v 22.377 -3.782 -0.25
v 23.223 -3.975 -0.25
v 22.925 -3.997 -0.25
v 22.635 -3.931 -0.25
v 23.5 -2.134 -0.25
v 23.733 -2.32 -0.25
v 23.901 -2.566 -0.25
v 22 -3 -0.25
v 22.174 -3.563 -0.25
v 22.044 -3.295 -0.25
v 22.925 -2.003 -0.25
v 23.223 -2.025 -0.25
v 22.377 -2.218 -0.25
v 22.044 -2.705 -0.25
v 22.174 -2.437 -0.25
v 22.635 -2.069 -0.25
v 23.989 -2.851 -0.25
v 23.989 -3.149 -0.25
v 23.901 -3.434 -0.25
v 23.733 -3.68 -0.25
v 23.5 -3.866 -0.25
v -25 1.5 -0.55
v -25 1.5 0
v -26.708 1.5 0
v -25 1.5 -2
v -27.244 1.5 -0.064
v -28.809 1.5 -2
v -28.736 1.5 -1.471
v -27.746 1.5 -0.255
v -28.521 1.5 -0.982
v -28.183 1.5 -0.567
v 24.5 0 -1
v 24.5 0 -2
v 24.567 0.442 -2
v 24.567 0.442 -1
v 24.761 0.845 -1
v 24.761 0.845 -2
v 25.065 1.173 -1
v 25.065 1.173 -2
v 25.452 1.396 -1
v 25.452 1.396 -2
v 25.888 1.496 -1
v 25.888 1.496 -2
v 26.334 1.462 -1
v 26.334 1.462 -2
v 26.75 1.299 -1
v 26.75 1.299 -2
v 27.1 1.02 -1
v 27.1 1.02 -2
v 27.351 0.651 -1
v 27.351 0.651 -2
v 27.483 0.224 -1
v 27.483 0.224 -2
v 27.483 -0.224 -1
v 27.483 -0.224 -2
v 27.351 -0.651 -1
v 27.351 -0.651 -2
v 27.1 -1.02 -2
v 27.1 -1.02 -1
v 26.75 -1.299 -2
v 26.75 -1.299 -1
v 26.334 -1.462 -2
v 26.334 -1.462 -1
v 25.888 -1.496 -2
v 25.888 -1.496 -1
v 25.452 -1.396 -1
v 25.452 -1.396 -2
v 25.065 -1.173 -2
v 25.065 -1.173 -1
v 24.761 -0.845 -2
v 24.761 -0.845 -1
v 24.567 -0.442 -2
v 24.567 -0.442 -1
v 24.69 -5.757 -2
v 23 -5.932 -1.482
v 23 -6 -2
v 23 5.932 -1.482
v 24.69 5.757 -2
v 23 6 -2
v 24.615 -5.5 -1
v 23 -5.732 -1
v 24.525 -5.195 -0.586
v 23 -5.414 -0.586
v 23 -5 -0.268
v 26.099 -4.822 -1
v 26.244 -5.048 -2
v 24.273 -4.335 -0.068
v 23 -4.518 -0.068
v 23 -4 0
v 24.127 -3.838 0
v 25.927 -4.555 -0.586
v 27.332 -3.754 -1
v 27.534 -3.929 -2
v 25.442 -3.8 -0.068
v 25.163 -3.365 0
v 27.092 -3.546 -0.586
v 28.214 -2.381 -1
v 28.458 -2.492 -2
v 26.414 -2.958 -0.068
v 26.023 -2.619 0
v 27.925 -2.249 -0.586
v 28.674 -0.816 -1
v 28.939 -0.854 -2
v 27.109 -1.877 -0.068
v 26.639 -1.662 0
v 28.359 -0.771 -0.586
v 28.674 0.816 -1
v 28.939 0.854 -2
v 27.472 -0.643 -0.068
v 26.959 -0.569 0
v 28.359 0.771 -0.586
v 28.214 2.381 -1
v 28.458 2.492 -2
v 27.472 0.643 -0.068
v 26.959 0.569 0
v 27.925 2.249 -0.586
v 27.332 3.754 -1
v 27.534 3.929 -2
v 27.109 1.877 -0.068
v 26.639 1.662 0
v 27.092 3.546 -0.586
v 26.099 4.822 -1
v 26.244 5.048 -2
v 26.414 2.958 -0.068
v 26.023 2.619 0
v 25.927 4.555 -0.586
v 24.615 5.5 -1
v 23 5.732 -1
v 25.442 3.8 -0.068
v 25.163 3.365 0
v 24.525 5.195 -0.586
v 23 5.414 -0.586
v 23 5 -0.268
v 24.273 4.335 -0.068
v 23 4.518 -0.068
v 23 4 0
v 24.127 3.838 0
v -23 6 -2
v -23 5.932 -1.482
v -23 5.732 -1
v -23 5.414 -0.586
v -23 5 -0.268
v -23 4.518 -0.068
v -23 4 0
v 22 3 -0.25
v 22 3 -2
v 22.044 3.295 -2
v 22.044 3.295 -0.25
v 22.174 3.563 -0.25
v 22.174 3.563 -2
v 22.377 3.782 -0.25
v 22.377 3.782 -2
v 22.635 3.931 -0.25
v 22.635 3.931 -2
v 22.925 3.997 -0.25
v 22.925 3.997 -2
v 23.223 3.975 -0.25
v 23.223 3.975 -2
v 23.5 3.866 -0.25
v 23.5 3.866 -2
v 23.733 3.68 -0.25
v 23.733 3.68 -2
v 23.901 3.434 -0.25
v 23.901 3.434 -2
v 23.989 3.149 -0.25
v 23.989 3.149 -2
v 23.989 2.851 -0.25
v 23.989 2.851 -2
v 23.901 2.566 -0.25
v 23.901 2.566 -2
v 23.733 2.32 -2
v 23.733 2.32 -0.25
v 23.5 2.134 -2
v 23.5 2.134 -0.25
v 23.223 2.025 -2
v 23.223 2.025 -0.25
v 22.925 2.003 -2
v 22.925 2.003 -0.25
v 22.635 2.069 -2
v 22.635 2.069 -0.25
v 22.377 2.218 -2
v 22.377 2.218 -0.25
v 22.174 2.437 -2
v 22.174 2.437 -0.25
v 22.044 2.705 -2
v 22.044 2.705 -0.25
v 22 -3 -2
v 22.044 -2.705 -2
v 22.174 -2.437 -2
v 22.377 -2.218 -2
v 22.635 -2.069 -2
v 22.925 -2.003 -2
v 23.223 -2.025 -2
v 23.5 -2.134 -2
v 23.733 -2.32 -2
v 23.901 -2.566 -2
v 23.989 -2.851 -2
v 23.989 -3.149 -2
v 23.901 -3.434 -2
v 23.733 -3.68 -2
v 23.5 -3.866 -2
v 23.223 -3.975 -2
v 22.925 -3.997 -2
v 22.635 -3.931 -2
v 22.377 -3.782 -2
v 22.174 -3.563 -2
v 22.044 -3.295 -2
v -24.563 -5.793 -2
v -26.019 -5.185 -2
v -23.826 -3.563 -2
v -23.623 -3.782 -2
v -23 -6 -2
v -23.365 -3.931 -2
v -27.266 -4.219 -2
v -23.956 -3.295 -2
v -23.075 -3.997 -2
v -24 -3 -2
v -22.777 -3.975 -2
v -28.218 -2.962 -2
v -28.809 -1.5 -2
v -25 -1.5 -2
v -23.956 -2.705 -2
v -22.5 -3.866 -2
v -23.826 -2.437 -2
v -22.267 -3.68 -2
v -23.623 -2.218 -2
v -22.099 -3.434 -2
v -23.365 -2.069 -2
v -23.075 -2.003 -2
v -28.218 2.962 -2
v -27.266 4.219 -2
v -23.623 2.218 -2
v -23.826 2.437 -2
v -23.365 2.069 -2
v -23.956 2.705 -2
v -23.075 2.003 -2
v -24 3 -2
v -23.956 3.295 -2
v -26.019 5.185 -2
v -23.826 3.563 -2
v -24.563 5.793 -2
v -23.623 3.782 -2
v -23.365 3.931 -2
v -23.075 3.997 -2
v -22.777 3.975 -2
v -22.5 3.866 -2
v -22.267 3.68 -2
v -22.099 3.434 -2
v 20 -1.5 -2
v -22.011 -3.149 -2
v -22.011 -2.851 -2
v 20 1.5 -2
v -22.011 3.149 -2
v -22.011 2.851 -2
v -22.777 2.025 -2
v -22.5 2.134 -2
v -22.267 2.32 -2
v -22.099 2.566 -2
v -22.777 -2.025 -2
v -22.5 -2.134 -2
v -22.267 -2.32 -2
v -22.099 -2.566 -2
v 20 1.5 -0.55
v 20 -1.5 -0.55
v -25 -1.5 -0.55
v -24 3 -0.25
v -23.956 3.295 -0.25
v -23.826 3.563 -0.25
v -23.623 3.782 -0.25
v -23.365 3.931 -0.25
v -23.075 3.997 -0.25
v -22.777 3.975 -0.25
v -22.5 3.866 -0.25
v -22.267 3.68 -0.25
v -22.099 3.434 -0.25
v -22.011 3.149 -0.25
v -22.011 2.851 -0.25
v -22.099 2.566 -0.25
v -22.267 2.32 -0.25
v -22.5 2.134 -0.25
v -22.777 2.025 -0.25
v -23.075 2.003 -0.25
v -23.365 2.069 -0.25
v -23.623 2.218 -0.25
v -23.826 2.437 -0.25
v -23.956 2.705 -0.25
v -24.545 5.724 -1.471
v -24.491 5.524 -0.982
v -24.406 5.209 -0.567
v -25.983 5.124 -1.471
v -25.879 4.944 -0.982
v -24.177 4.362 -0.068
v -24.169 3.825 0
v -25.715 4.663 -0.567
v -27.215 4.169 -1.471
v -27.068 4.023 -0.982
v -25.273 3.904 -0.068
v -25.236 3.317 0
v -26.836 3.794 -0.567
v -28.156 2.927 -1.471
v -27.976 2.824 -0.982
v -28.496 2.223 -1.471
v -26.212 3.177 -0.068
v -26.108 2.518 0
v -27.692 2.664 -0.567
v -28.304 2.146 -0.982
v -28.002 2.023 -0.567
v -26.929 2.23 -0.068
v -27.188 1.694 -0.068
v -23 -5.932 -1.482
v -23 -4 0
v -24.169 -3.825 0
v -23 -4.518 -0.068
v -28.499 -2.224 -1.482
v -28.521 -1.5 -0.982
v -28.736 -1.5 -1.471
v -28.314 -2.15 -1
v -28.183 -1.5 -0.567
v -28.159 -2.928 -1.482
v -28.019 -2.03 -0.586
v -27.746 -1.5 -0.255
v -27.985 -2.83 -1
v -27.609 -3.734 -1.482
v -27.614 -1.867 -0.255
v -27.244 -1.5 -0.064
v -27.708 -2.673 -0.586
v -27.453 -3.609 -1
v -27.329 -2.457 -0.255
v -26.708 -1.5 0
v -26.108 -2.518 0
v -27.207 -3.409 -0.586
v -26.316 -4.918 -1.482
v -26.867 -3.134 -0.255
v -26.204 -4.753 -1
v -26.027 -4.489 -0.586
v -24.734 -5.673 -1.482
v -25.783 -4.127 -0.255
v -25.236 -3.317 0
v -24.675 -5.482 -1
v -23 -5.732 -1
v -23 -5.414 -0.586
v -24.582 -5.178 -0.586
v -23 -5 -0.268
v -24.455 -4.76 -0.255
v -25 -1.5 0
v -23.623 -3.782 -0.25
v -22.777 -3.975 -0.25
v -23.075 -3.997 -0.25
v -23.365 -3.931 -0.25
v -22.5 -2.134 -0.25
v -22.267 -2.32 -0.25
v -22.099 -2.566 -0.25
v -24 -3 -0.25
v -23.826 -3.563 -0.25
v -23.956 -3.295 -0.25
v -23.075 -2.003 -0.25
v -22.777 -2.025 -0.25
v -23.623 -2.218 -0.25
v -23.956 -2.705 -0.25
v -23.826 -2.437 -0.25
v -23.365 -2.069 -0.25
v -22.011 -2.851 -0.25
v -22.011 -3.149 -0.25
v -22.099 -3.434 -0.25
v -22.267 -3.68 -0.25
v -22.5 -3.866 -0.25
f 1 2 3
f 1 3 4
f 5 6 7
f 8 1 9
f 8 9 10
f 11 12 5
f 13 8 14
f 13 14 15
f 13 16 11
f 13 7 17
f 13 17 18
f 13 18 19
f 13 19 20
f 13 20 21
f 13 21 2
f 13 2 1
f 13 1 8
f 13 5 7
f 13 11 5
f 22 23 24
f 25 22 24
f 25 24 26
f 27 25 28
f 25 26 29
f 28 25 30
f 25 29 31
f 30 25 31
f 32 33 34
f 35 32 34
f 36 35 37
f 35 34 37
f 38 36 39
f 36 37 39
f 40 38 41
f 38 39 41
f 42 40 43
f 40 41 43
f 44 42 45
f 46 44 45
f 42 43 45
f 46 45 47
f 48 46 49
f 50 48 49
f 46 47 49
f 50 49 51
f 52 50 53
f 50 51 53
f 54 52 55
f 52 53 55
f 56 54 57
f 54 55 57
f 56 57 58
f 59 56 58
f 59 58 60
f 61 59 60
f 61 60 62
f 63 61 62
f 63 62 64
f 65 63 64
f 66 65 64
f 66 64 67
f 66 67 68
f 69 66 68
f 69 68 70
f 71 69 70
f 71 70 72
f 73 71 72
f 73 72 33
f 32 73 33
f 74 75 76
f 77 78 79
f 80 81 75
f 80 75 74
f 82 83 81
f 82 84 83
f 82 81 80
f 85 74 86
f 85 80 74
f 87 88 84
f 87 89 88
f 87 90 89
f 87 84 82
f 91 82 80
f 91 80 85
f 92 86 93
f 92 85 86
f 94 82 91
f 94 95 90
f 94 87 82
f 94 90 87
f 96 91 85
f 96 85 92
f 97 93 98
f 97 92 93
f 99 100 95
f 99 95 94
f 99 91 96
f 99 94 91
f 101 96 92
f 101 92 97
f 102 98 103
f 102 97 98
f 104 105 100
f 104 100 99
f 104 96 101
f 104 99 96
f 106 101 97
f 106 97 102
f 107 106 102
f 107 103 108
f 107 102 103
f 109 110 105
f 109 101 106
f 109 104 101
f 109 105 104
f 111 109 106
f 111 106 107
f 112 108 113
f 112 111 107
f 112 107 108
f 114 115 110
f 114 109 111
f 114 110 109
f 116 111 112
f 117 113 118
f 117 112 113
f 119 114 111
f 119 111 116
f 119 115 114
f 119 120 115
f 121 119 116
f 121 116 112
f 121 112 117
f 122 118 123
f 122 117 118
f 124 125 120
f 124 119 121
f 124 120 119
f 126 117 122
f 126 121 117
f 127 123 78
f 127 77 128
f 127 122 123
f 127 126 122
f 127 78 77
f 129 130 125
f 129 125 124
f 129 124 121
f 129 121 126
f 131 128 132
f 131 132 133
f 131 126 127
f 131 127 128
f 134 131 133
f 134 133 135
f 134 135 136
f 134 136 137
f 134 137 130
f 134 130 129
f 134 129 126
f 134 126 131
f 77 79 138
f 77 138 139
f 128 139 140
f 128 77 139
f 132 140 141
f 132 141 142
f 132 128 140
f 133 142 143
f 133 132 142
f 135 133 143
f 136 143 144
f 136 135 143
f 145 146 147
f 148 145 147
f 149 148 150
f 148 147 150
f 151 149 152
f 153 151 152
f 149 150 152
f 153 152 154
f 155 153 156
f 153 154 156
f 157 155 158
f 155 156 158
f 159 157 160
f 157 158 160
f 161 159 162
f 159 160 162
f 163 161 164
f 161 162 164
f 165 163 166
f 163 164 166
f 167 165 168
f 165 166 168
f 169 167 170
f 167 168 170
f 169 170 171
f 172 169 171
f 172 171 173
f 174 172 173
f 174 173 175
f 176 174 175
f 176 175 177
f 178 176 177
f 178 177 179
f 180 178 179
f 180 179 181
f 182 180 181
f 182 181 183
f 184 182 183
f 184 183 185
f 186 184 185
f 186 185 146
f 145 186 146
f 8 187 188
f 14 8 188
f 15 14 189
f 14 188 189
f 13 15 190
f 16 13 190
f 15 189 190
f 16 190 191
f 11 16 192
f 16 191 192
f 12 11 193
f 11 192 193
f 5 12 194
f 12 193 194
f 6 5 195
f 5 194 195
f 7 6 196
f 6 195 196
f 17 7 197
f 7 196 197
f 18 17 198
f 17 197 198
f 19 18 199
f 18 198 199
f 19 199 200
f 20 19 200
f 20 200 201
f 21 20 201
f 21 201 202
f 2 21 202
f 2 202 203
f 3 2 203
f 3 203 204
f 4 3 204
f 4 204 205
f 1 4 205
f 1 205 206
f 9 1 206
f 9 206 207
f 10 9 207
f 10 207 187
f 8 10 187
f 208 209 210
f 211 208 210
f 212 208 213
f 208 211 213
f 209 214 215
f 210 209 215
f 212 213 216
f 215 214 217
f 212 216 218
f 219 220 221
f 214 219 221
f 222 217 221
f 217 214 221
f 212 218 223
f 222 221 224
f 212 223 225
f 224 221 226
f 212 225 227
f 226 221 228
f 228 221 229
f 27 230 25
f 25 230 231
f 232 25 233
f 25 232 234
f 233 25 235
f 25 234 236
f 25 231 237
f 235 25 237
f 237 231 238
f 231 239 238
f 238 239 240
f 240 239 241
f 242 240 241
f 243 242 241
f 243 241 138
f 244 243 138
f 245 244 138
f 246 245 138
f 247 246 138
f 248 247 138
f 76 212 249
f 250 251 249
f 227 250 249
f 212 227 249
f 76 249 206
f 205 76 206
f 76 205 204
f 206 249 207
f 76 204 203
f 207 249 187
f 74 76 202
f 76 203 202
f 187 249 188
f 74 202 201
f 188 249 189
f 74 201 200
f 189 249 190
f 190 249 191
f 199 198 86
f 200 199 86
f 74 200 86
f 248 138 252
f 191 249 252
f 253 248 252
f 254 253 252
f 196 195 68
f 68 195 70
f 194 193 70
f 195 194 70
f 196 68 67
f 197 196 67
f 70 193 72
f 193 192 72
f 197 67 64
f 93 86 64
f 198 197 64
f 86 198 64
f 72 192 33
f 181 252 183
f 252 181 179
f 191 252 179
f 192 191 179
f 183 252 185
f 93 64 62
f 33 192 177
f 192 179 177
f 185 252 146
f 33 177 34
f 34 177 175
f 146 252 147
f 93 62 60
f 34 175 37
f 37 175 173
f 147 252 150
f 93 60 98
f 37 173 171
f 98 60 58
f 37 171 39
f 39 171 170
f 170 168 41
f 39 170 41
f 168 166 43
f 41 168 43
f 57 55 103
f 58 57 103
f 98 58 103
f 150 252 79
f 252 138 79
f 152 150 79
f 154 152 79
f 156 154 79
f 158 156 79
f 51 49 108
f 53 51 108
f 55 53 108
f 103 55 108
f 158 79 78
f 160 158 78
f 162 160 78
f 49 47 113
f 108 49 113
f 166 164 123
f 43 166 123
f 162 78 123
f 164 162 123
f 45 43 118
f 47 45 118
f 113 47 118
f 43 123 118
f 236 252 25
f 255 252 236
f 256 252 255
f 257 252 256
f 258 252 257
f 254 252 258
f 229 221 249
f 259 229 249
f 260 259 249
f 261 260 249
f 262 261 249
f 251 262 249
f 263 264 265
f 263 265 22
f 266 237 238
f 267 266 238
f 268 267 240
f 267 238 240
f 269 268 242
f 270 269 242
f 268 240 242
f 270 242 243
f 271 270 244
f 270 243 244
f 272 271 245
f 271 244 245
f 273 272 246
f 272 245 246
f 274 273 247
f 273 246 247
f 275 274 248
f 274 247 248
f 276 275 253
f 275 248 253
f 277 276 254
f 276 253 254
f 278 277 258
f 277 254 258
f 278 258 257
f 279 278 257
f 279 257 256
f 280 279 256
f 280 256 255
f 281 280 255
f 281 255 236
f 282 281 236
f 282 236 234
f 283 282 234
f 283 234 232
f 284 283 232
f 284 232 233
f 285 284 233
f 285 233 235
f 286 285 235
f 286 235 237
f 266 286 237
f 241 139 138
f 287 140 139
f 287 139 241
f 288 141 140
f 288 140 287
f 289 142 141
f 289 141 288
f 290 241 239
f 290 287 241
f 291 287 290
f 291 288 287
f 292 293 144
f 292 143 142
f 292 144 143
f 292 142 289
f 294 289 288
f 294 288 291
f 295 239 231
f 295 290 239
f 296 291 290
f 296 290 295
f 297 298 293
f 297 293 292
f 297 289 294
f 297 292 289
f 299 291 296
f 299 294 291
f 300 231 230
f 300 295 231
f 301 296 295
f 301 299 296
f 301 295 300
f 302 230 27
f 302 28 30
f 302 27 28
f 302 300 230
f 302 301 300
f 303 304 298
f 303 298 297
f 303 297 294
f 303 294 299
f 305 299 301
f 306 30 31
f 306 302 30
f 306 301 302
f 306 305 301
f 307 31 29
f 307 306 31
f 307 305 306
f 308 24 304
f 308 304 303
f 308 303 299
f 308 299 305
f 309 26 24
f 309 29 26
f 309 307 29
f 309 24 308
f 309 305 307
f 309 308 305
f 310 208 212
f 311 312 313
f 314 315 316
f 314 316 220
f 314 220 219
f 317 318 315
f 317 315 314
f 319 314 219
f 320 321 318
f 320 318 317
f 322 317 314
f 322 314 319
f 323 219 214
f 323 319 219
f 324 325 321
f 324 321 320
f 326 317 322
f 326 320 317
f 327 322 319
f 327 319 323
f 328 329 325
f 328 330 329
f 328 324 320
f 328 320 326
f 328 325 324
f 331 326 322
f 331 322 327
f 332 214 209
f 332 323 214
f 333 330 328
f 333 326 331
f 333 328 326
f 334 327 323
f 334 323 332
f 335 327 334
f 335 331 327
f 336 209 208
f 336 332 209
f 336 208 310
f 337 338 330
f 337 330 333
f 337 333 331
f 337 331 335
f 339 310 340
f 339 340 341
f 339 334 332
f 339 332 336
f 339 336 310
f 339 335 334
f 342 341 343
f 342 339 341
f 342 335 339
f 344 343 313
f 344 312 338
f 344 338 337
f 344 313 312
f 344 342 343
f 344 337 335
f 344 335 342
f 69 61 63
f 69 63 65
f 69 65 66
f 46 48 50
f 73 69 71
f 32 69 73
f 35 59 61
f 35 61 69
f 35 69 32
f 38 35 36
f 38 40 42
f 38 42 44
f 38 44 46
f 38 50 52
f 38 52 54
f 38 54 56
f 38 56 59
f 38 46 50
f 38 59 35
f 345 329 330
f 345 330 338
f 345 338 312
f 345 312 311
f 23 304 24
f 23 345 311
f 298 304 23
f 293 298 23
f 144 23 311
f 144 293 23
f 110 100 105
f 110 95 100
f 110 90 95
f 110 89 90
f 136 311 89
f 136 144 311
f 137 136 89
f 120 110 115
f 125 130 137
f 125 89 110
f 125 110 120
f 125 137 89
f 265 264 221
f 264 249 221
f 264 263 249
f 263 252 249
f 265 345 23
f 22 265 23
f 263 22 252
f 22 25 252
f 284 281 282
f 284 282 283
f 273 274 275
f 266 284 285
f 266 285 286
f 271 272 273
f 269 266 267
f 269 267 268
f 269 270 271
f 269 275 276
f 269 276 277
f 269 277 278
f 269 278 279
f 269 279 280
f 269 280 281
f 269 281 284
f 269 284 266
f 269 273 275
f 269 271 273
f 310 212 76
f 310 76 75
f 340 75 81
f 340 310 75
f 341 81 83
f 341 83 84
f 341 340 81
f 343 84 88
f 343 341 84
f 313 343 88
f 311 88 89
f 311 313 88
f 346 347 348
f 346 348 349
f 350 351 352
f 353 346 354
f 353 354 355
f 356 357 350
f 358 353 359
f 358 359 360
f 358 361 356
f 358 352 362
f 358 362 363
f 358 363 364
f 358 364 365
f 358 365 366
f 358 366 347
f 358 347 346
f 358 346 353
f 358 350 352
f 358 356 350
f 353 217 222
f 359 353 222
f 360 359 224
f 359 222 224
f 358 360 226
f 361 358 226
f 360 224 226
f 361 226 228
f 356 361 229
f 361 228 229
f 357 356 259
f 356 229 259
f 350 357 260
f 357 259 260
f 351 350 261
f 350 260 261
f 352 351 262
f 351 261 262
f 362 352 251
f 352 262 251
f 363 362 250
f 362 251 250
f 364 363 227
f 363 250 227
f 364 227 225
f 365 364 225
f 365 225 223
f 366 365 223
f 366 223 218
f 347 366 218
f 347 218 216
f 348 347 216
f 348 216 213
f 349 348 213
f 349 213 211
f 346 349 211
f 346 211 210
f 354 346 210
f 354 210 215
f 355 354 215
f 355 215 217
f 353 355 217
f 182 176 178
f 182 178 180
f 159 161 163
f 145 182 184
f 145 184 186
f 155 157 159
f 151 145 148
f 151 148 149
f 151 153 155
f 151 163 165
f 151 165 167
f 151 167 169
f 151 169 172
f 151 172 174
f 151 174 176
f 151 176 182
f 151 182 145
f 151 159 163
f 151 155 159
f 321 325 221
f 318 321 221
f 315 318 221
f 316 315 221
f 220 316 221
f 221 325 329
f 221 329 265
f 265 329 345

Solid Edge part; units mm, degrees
sketch "Sketch1" plane through (0, 0, 0) normal (0, 0, 1) x (1, 0, 0)
  line L0 (-23, -6) -> (23, -6)
  arc A0 (23, 6) -> (23, -6) centre (23, 0) cw
  line L1 (23, 6) -> (-23, 6)
  arc A1 (-23, 6) -> (-23, -6) centre (-23, 0) ccw
  arc A2 (-28.8095, 1.5) -> (-28.8095, -1.5) centre (-23, 0) ccw
  line L2 (-28.8095, -1.5) -> (-25, -1.5)
  line L3 (-25, -1.5) -> (-25, 1.5)
  line L4 (-25, 1.5) -> (-28.8095, 1.5)
extrude "Protrusion1" add sketch "Sketch1" against normal blind 2
fillet "Round_1" radius 2 4 edges at (0, -6, 0) (29, 0, 0) (0, 6, 0) (-29, 0, 0)
sketch "Sketch2" plane through (0, 0, 0) normal (0, 0, 1) x (1, 0, 0)
  line L0 (-28.8095, -1.5) -> (-25, -1.5)
  line L1 (-25, -1.5) -> (-25, 1.5)
  line L2 (-25, 1.5) -> (-28.8095, 1.5)
  arc A0 (-28.8095, 1.5) -> (-28.8095, -1.5) centre (-23, 0) ccw
extrude "ExtrudedCutout_1" cut sketch "Sketch2" against normal blind 2
sketch "Sketch3" plane through (0.0953, 0, -2) normal (0, 0, -1) x (-1, 0, 0)
  line L0 (-19.9047, -1.5) -> (25.0953, -1.5)
  line L1 (25.0953, -1.5) -> (25.0953, 1.5)
  line L2 (25.0953, 1.5) -> (-19.9047, 1.5)
  line L3 (-19.9047, 1.5) -> (-19.9047, -1.5)
extrude "ExtrudedCutout_2" cut sketch "Sketch3" against normal blind 1.25
sketch "Sketch4" plane through (0.0953, 0, -2) normal (0, 0, -1) x (-1, 0, 0)
  circle A0 centre (23.0953, -3) radius 1
extrude "ExtrudedCutout_3" cut sketch "Sketch4" against normal blind 1.75
sketch "Sketch5" plane through (0.0953, 0, -2) normal (0, 0, -1) x (-1, 0, 0)
  circle A0 centre (23.0953, 3) radius 1
extrude "ExtrudedCutout_4" cut sketch "Sketch5" against normal blind 1.75
sketch "Sketch6" plane through (0.0953, 0, -2) normal (0, 0, -1) x (-1, 0, 0)
  circle A0 centre (-22.9047, -3) radius 1
extrude "ExtrudedCutout_6" cut sketch "Sketch6" against normal blind 1.75
sketch "Sketch7" plane through (0.0953, 0, -2) normal (0, 0, -1) x (-1, 0, 0)
  circle A0 centre (-22.9047, 3) radius 1
extrude "ExtrudedCutout_7" cut sketch "Sketch7" against normal blind 1.75
sketch "Sketch8" plane through (0.0953, 0, -2) normal (0, 0, -1) x (-1, 0, 0)
  circle A0 centre (-25.9047, 0) radius 1.5
extrude "ExtrudedCutout_8" cut sketch "Sketch8" against normal blind 1
sketch "Sketch9" plane through (-25, 0, -0.375) normal (-1, 0, 0) x (0, 0, 1)
  line L0 (-0.375, 1.5) -> (-0.375, -1.5)
  line L1 (-0.375, -1.5) -> (-0.175, -1.5)
  line L2 (-0.175, -1.5) -> (-0.175, 1.5)
  line L3 (-0.175, 1.5) -> (-0.375, 1.5)
extrude "ExtrudedCutout_9" cut sketch "Sketch9" against normal blind 45
